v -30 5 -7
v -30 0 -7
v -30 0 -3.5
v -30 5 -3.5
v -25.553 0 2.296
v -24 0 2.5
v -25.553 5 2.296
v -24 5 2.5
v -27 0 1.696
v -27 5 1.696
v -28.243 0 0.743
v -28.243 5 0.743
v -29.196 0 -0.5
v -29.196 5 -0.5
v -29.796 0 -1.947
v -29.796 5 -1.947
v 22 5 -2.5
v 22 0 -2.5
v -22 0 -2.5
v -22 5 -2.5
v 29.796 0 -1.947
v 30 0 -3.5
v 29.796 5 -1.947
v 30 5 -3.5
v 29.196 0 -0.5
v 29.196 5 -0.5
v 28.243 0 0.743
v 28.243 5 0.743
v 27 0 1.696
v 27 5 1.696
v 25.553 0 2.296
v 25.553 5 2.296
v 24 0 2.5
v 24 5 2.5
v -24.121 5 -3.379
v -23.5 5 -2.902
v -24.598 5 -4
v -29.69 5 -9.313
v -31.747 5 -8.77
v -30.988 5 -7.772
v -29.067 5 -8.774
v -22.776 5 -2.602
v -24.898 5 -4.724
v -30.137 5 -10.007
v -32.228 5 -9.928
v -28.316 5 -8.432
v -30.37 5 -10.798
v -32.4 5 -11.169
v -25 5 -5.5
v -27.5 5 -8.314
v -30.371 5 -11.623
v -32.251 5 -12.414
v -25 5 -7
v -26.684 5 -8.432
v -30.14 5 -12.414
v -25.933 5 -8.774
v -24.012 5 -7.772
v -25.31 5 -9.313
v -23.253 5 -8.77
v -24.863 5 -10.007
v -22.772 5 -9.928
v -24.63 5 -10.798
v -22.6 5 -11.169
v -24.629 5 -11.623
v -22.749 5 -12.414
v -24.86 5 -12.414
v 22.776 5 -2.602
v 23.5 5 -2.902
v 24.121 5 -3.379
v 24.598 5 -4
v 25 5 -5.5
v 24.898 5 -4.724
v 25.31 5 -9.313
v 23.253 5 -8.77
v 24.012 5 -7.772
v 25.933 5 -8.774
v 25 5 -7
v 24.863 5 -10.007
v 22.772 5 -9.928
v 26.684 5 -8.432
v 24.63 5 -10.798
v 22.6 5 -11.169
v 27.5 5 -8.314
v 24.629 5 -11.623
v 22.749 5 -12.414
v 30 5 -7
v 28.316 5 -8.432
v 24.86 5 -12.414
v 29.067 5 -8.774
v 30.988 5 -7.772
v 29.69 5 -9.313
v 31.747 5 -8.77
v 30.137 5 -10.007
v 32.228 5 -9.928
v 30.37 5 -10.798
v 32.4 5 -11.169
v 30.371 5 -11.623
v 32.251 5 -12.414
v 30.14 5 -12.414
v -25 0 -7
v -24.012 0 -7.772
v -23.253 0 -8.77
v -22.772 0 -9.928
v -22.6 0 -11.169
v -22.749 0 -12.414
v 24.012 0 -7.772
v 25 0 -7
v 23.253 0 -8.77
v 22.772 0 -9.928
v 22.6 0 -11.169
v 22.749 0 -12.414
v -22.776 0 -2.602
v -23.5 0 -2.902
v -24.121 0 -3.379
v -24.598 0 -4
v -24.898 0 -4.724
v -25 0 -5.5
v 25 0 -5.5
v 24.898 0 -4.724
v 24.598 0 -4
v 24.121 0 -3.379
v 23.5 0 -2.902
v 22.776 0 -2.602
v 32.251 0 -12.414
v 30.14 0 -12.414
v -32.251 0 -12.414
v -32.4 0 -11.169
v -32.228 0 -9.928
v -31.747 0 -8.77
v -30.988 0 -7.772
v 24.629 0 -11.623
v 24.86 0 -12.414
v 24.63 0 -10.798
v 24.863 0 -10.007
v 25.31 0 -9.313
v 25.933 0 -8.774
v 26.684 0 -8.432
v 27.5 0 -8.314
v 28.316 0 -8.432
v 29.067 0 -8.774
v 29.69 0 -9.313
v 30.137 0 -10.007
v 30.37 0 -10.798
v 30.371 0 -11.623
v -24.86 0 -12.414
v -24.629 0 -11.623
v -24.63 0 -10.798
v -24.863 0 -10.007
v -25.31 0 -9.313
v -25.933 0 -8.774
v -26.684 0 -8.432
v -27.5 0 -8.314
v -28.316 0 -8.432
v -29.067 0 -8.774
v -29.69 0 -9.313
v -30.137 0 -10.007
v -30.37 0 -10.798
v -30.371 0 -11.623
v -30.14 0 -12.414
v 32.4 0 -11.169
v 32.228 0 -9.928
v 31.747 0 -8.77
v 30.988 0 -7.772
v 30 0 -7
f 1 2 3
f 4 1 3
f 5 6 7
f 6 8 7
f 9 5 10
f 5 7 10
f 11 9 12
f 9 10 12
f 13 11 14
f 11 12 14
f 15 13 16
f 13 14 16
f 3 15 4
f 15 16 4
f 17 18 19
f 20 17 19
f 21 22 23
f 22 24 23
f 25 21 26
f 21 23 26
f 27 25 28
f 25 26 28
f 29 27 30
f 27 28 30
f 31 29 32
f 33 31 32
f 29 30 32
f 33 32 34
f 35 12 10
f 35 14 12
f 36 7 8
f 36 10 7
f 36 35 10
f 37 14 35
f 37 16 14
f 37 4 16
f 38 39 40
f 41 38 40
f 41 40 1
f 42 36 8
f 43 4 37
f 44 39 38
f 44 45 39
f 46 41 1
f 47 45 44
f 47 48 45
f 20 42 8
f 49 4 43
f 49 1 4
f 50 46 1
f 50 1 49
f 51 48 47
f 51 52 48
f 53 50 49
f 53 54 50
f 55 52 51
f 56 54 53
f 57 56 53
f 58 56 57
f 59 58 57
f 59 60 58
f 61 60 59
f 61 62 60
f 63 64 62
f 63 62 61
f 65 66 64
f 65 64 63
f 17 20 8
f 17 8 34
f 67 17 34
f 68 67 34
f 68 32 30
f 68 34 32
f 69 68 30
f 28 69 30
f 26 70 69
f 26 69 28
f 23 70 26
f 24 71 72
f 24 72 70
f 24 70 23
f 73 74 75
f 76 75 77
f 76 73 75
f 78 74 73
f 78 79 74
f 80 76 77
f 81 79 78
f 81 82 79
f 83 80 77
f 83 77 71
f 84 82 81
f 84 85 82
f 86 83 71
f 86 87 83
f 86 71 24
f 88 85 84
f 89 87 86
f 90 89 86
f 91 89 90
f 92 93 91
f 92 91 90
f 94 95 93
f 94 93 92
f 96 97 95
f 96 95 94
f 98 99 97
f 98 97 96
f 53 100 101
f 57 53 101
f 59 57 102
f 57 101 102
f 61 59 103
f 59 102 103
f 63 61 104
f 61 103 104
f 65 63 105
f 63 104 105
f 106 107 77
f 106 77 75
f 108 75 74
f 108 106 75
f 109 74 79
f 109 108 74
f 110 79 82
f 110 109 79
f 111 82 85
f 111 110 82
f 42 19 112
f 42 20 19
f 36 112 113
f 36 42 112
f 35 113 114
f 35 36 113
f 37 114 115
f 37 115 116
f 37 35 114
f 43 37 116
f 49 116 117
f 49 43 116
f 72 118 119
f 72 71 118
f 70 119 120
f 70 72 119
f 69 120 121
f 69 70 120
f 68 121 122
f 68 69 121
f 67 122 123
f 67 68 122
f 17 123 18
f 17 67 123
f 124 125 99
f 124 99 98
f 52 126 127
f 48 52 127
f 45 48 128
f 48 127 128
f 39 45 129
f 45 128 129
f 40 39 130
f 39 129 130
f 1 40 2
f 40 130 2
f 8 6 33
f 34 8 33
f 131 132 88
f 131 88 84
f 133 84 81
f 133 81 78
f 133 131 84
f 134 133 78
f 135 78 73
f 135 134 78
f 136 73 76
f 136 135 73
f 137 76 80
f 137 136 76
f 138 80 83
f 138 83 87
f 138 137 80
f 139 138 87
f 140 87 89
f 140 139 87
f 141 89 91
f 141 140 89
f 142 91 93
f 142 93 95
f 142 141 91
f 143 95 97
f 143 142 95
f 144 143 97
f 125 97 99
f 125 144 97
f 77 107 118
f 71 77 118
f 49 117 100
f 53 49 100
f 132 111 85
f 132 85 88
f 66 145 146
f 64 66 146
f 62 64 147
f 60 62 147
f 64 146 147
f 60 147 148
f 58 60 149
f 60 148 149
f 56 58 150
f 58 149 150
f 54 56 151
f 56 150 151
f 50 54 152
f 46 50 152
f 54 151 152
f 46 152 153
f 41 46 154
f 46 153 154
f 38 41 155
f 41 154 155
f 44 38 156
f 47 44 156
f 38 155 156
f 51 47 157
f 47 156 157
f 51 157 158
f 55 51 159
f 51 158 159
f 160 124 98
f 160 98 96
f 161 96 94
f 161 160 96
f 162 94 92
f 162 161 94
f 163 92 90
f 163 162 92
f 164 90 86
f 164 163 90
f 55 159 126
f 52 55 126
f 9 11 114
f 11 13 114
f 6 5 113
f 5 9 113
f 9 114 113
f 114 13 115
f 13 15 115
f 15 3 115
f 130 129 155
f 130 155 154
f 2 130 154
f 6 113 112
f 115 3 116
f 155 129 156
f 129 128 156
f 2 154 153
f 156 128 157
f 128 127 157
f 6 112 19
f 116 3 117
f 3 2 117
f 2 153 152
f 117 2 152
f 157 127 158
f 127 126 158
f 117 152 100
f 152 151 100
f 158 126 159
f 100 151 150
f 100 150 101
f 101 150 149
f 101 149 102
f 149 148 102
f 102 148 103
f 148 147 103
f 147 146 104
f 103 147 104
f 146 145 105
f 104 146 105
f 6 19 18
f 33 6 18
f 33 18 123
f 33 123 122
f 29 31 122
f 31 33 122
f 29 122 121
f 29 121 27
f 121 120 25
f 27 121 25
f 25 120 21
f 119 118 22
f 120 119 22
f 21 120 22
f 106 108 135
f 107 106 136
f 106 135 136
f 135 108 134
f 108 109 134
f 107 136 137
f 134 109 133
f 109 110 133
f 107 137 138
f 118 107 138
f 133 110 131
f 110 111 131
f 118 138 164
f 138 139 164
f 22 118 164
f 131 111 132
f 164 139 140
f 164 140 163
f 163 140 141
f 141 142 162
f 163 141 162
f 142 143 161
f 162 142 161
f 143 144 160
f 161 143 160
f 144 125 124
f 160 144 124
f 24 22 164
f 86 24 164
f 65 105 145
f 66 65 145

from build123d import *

# Parameters (mm, degrees)
BOSS_EXTRUDE1_DEPTH = 5
FILLET1_R           = 3
FILLET2_R           = 6


with BuildPart() as part:
    # Sketch2 → Boss-Extrude1 (new body)
    with BuildSketch(Plane(origin=(0, 0, 0), x_dir=(1, 0, 0), z_dir=(0, 1, 0))):
        with BuildLine():
            ThreePointArc((-32.250789408, 12.414261501), (-27.5, 6.314261501), (-22.749210592, 12.414261501))
            Line((-22.749210592, 12.414261501), (-24.859924244, 12.414261501))
            ThreePointArc((-24.859924244, 12.414261501), (-27.5, 8.314261501), (-30.140075756, 12.414261501))
            Line((-30.140075756, 12.414261501), (-32.250789408, 12.414261501))
        make_face()
        with BuildLine():
            Line((25, 7), (25, 2.5))
            Line((25, 2.5), (-25, 2.5))
            Line((-25, 2.5), (-25, 7))
            ThreePointArc((-25, 7), (-27.5, 6.314261501), (-30, 7))
            Line((-30, 7), (-30, -2.5))
            Line((-30, -2.5), (30, -2.5))
            Line((30, -2.5), (30, 7))
            ThreePointArc((30, 7), (27.5, 6.314261501), (25, 7))
        make_face()
        with BuildLine():
            Line((30.140075756, 12.414261501), (32.250789408, 12.414261501))
            ThreePointArc((32.250789408, 12.414261501), (27.5, 6.314261501), (22.749210592, 12.414261501))
            Line((22.749210592, 12.414261501), (24.859924244, 12.414261501))
            ThreePointArc((24.859924244, 12.414261501), (27.5, 8.314261501), (30.140075756, 12.414261501))
        make_face()
    extrude(amount=BOSS_EXTRUDE1_DEPTH)

    # Fillet1
    fillet1_edges = [part.edges().sort_by_distance(p)[0] for p in [
        (-25, 2.5, -2.5),
        (25, 2.5, -2.5),
    ]]
    fillet(fillet1_edges, radius=FILLET1_R)

    # Fillet2
    fillet2_edges = [part.edges().sort_by_distance(p)[0] for p in [
        (30, 2.5, 2.5),
        (-30, 2.5, 2.5),
    ]]
    fillet(fillet2_edges, radius=FILLET2_R)


solid = part.part
